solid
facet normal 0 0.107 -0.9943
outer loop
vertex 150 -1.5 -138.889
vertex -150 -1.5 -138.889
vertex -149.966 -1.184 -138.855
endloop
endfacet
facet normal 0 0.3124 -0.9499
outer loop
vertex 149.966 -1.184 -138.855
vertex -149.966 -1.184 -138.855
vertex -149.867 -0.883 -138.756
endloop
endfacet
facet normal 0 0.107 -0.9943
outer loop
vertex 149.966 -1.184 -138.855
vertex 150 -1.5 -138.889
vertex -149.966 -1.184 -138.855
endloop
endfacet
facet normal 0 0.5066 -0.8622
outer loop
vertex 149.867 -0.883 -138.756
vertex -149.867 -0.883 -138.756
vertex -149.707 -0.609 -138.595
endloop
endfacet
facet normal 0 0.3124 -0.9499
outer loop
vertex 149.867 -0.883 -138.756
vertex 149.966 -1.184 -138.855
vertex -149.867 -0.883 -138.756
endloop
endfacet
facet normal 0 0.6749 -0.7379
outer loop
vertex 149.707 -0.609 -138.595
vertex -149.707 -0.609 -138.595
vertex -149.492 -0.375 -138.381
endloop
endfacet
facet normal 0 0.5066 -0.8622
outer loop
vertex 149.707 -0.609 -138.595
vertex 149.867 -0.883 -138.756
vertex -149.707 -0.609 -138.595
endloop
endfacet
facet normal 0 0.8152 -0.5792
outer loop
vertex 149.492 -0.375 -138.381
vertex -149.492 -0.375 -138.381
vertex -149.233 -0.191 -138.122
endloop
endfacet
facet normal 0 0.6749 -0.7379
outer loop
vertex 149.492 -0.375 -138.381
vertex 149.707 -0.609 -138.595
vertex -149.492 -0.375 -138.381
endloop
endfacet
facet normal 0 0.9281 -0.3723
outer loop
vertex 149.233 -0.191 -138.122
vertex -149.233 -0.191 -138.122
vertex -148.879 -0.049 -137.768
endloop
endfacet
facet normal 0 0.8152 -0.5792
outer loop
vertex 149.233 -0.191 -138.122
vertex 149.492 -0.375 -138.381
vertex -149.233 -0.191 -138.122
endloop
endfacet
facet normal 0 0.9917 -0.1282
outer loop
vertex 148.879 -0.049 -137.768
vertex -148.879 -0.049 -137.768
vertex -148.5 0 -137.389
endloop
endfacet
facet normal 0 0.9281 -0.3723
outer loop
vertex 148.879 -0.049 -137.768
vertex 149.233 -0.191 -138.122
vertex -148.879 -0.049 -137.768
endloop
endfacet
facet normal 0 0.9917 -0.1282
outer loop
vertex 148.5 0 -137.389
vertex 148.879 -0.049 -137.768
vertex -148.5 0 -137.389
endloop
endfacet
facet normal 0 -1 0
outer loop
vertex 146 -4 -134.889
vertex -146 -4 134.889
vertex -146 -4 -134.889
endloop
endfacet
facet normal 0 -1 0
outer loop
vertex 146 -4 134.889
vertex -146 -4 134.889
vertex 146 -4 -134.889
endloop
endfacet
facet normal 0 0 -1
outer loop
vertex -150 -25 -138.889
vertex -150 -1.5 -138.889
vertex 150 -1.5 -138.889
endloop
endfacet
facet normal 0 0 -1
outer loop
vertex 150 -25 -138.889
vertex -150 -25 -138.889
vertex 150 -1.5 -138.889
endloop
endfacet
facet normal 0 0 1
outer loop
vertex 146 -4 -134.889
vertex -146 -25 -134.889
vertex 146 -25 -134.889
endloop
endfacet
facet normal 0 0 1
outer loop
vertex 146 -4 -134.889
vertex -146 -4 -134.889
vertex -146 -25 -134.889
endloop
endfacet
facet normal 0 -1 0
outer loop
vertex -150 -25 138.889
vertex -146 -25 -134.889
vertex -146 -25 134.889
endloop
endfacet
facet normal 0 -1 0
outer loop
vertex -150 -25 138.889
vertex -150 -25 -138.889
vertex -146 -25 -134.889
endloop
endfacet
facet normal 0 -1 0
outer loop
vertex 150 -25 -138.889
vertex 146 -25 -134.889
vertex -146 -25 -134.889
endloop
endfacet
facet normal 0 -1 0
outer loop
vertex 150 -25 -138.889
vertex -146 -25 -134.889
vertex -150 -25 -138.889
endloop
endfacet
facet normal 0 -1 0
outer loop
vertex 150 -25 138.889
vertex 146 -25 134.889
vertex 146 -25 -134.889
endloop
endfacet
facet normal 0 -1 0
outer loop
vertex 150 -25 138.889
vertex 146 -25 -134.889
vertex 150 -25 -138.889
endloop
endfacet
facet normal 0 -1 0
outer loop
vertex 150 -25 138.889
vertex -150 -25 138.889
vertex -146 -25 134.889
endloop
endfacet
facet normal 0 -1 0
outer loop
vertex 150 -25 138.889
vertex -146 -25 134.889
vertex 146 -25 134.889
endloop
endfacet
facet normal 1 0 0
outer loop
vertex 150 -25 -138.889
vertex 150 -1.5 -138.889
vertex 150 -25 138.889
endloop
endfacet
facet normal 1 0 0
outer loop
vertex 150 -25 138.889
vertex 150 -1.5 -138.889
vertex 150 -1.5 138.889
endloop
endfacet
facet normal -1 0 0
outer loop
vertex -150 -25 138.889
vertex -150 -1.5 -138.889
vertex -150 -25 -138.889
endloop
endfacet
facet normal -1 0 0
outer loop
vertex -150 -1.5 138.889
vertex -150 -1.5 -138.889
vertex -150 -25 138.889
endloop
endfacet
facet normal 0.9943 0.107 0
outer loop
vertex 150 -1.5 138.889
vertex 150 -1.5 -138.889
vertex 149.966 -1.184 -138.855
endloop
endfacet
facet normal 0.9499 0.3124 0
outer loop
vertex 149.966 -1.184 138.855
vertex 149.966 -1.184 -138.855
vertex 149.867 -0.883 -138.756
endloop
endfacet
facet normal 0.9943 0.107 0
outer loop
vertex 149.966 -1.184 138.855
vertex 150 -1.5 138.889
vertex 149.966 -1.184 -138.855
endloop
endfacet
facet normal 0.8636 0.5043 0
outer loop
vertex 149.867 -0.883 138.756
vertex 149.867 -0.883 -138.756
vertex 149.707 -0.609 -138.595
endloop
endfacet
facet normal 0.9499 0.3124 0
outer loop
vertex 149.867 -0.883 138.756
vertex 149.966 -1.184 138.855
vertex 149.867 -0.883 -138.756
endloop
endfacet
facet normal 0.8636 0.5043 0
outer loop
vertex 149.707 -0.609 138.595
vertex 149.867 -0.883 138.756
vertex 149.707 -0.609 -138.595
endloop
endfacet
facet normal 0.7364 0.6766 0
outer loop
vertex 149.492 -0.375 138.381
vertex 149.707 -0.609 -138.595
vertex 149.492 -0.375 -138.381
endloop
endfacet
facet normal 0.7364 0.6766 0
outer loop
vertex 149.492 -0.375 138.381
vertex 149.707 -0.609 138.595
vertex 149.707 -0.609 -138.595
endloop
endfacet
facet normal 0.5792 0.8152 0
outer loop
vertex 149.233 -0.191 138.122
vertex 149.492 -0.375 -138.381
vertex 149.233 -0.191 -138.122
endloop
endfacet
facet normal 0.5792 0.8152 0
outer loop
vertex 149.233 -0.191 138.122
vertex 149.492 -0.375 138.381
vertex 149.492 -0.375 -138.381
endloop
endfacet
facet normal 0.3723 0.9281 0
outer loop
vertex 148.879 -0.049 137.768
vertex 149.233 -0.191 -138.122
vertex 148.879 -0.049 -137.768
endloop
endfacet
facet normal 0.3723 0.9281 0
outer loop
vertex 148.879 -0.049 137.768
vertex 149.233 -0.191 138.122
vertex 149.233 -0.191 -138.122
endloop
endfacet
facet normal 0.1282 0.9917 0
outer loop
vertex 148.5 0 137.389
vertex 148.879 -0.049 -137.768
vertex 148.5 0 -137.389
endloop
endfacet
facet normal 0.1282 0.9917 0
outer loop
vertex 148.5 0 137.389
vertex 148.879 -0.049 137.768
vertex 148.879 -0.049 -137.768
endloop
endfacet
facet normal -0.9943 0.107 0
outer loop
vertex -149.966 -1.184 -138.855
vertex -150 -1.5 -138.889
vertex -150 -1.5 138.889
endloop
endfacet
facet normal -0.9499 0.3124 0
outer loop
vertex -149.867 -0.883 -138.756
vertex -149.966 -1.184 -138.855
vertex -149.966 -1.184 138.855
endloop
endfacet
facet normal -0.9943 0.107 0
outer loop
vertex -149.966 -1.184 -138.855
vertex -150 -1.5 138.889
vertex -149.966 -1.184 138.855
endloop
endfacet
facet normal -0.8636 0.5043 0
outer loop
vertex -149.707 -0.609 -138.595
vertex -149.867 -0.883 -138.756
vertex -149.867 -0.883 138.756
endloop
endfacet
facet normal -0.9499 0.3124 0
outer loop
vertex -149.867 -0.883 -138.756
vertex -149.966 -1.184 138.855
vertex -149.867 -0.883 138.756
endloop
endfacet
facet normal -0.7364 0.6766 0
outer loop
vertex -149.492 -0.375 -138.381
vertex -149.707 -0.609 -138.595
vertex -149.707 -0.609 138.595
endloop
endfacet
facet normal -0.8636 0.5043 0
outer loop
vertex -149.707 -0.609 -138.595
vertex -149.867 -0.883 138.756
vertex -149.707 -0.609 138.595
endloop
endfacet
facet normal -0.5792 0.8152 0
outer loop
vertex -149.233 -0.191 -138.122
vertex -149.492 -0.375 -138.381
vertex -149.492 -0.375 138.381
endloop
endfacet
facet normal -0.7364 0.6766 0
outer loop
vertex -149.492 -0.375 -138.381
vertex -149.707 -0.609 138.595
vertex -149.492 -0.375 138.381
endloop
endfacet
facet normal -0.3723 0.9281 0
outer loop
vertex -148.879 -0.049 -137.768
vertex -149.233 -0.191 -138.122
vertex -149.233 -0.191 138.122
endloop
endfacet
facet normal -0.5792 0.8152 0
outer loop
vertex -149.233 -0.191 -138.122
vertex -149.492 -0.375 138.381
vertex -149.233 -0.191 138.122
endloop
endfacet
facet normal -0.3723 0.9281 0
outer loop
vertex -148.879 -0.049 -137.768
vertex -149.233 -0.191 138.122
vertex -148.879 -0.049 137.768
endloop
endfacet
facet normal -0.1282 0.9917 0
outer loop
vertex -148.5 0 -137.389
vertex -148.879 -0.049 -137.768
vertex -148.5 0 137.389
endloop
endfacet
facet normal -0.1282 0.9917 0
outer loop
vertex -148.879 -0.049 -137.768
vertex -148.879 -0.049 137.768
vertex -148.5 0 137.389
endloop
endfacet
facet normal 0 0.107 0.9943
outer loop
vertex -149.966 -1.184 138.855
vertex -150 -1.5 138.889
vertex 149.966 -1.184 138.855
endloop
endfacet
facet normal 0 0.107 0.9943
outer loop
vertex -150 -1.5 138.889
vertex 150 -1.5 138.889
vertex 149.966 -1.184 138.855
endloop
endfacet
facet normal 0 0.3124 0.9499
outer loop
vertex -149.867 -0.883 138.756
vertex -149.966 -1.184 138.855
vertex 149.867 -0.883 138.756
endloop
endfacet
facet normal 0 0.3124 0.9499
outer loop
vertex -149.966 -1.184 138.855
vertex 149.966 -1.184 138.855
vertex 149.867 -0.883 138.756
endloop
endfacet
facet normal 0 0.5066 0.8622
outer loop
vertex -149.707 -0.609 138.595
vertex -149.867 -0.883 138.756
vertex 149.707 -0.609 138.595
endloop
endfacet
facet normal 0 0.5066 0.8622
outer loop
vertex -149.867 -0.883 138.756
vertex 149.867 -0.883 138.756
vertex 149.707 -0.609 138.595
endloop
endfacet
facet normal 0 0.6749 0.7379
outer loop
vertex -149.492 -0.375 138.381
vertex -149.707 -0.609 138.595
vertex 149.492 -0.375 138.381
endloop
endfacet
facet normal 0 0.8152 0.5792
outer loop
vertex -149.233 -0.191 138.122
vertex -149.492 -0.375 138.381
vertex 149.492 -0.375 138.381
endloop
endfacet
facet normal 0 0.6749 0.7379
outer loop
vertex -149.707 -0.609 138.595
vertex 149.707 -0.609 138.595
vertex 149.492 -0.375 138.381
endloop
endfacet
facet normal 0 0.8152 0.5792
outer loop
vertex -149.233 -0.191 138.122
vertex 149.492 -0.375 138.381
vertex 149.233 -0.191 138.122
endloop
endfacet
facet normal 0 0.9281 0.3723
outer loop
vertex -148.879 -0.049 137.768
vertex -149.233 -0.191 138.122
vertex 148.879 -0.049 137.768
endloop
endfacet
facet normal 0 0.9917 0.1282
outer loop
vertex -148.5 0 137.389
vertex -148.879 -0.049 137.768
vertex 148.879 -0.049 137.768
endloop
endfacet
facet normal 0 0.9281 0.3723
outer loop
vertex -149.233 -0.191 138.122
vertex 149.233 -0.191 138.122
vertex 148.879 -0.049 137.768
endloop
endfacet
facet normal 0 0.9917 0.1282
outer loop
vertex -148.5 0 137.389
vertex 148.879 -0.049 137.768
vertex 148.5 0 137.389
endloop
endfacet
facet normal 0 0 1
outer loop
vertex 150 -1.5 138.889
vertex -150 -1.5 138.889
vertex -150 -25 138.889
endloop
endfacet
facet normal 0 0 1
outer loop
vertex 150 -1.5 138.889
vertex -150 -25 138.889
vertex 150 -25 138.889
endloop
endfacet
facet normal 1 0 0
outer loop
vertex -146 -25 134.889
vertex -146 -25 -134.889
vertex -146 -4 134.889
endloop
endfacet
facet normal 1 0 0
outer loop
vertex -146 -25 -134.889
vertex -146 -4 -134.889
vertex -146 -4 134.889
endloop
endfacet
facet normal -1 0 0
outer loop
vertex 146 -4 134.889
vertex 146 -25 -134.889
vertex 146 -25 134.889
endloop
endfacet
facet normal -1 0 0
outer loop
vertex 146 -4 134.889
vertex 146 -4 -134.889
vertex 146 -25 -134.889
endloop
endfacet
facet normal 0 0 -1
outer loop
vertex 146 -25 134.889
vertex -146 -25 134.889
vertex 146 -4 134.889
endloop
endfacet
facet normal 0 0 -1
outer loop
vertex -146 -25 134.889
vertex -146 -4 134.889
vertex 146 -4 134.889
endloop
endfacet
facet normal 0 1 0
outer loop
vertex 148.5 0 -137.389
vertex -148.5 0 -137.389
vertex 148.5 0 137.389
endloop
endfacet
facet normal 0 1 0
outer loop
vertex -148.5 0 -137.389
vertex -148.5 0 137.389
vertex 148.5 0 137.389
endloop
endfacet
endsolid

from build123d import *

# Parameters (mm, degrees)
F0_W     = 300
F0_H     = 277.777704
F1_DEPTH = 25
F2_T     = -4
F3_R     = 1.5


with BuildPart() as f1:
    # F0 (on Front) → F1 (new body)
    with BuildSketch(Plane.XZ):
        Rectangle(F0_W, F0_H)
    extrude(amount=F1_DEPTH)

    # F2
    f2_openings = [f1.faces().sort_by_distance(p)[0] for p in [
        (0, -25, 0),
    ]]
    offset(amount=F2_T, openings=f2_openings)

    # F3
    f3_edges = [f1.edges().sort_by_distance(p)[0] for p in [
        (0, 0, -138.888852),
        (150, 0, 0),
        (0, 0, 138.888852),
        (-150, 0, 0),
    ]]
    fillet(f3_edges, radius=F3_R)


solid = f1.part
